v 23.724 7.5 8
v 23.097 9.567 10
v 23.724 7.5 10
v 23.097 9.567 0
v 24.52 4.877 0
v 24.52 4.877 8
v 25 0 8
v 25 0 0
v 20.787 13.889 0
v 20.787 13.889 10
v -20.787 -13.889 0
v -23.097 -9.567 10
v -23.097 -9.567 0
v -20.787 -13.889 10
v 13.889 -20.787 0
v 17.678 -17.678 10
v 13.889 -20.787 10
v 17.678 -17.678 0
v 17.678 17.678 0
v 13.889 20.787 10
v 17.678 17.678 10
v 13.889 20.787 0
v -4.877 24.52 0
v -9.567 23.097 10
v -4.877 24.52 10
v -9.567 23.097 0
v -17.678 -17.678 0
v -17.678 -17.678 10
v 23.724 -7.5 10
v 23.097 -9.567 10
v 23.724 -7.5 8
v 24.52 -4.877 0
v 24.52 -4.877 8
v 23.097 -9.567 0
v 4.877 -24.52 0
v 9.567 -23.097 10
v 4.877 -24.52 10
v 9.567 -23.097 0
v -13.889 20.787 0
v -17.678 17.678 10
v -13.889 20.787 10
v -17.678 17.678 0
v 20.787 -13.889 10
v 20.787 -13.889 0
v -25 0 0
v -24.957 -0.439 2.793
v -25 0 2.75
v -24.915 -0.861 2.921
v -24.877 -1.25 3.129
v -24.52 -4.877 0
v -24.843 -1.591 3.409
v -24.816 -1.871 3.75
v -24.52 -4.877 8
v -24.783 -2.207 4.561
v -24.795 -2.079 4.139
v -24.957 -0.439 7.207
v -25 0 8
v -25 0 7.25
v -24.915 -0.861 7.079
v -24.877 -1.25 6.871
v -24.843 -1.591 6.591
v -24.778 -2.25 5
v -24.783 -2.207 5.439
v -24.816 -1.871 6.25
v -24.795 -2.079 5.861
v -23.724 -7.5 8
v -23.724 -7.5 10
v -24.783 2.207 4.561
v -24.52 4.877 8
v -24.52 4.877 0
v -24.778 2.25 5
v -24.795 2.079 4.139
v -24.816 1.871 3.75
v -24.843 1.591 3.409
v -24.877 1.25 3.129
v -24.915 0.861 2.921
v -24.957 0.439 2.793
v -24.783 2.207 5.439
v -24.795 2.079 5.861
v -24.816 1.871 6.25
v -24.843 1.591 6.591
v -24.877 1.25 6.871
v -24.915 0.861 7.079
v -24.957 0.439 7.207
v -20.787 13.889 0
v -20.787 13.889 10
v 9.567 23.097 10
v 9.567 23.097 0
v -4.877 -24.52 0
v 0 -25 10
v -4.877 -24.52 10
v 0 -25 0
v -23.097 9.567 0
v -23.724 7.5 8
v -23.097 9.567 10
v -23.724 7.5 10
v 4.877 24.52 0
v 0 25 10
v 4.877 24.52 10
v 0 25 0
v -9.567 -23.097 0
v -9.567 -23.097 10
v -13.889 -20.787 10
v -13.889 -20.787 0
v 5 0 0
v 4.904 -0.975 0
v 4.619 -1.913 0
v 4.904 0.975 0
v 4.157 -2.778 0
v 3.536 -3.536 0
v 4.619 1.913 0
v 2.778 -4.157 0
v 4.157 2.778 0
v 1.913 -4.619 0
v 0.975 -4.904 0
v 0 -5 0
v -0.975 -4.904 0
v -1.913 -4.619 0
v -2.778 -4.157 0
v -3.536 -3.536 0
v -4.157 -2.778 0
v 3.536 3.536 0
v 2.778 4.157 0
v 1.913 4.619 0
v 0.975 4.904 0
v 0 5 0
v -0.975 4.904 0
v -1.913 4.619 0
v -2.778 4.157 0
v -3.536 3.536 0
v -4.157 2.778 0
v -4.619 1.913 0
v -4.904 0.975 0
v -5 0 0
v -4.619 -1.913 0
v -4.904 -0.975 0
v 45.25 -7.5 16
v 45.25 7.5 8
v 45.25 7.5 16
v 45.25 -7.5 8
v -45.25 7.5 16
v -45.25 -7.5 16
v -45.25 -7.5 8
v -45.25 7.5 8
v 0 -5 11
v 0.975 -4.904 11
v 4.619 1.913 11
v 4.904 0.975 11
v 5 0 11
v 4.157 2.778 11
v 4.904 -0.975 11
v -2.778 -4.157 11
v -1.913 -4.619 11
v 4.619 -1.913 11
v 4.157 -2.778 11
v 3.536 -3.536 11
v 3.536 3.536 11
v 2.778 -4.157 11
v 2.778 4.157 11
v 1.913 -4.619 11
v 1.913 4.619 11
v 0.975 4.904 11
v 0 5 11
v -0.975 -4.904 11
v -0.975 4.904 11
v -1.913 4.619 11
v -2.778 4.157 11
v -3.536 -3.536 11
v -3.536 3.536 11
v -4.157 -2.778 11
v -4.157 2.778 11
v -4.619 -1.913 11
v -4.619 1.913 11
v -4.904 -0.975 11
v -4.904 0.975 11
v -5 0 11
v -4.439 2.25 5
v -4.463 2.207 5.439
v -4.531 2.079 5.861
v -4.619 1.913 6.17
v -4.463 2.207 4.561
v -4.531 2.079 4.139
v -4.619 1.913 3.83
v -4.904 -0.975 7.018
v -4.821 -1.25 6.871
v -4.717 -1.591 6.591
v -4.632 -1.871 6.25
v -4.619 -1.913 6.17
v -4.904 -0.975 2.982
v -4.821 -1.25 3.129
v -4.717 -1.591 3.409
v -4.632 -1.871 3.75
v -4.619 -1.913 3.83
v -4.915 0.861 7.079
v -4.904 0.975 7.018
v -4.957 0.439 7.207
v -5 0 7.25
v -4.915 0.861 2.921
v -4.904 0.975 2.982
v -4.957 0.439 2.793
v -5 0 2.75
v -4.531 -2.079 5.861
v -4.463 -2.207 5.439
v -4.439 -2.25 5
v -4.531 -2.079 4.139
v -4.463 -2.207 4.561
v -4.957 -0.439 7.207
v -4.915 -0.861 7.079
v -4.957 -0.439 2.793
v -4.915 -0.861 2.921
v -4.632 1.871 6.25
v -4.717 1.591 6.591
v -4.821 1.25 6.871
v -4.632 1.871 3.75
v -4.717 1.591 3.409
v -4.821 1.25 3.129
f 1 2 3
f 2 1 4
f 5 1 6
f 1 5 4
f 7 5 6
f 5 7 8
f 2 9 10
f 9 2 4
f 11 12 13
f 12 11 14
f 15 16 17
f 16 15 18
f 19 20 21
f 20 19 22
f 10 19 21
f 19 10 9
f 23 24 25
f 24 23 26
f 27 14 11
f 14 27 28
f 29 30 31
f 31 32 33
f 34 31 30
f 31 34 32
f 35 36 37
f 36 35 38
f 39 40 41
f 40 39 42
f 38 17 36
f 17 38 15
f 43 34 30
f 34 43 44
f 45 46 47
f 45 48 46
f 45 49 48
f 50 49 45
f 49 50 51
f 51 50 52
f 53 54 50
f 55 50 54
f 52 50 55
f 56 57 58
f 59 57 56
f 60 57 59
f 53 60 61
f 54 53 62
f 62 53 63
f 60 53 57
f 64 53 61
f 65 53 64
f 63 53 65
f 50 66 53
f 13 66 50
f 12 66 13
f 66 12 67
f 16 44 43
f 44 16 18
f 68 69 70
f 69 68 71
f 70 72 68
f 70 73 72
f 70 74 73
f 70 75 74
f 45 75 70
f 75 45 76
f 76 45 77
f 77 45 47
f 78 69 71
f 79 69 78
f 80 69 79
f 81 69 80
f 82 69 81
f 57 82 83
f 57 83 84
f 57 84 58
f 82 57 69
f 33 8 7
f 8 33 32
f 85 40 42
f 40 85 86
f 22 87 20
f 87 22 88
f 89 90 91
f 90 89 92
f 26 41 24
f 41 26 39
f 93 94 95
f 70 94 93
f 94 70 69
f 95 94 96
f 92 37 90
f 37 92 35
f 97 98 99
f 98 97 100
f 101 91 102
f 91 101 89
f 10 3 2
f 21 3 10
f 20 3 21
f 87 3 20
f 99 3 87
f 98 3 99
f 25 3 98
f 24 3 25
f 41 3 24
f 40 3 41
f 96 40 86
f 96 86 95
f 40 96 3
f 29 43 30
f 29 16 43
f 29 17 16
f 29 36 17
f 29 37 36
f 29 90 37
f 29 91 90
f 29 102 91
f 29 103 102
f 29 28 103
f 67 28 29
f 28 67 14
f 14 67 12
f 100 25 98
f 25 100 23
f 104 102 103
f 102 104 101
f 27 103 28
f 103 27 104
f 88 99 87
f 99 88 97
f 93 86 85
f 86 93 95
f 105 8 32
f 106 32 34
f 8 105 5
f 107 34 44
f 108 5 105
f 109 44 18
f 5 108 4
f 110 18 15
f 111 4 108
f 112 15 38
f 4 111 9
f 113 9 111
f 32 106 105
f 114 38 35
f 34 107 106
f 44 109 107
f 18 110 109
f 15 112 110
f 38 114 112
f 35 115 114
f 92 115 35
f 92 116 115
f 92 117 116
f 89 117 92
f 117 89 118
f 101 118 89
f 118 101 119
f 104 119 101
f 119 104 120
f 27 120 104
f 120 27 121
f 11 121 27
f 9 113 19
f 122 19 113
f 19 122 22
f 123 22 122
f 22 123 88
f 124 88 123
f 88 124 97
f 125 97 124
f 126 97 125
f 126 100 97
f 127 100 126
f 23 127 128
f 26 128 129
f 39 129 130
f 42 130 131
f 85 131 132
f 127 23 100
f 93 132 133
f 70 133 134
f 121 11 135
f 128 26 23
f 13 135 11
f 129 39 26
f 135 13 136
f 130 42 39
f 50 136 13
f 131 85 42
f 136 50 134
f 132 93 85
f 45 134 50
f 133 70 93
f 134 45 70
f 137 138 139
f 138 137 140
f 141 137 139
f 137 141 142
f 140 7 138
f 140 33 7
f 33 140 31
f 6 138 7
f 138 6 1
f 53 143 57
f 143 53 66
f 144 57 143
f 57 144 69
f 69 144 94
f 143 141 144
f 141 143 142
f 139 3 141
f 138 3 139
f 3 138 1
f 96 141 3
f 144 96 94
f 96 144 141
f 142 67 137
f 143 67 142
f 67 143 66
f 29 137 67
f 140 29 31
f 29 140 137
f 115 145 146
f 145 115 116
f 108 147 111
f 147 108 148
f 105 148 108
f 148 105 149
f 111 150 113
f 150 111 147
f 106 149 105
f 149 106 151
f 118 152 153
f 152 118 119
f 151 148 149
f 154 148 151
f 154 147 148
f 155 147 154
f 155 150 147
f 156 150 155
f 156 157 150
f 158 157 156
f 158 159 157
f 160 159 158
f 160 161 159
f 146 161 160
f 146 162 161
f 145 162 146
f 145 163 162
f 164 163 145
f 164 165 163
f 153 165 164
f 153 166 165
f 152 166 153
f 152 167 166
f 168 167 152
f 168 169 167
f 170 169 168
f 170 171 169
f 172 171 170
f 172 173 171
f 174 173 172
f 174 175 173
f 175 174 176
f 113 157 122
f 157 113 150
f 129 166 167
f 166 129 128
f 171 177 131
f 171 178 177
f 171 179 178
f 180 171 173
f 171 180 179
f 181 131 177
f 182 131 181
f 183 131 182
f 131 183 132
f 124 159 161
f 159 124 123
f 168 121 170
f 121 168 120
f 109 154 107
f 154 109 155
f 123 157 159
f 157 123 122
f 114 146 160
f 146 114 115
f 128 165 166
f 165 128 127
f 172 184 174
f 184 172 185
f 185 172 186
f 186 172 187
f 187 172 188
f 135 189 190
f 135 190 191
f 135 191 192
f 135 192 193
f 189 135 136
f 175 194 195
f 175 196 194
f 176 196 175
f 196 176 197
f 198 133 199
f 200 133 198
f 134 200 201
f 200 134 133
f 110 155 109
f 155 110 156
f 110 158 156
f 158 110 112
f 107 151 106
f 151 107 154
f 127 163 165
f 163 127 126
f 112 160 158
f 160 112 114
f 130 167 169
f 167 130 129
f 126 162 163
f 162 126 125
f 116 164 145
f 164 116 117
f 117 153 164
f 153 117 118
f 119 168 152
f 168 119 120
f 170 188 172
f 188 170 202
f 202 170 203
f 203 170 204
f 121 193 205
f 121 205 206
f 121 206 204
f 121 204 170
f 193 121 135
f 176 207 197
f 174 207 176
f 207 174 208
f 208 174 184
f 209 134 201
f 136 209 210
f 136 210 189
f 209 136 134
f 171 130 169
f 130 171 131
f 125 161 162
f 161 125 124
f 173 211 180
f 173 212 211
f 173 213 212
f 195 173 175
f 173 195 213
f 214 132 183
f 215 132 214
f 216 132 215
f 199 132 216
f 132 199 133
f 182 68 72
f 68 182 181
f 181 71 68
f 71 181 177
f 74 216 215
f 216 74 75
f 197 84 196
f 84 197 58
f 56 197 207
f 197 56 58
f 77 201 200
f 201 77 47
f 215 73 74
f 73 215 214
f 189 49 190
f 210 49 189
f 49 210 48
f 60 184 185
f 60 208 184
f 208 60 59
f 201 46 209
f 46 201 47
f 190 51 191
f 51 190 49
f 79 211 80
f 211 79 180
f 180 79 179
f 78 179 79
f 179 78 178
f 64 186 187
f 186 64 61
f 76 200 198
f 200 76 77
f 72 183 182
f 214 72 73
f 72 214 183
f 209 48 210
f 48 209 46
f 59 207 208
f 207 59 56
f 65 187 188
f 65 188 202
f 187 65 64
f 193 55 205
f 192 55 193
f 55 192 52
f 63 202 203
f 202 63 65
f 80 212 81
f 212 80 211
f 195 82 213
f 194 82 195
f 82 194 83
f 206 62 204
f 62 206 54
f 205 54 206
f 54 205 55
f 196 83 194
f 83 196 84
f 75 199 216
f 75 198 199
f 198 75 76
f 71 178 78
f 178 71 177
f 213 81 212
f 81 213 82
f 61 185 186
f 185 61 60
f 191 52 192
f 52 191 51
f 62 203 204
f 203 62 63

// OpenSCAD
$fn = 32;

// ----------------------------------------------------------------------
// Hand knob: 50 x 90.5 x 10 mm
// ----------------------------------------------------------------------

// --- parameters (mm) ---
head_d = 50;              // knob diameter
head_h = 10;              // knob height
hole_d = 10;              // shaft bore
set_d = 4.5;              // set screw tap hole
wing_l = 90.5;            // wing span
wing_w = 15;              // wing width
wing_h = 6;               // wing thickness

module body() {
  cylinder(h = head_h, d = head_d);
}

module wing() {
  /* wing sunk 2 mm into the knob so the joint overlaps */
  translate([-wing_l / 2, -wing_w / 2, head_h - 2])
    cube([wing_l, wing_w, wing_h + 2]);
}

difference() {
  union() {
    body();
    wing();
  }
  translate([0, 0, -1]) cylinder(h = head_h + 0 + 2, d = hole_d);
  translate([-head_d / 2 - 1, 0, head_h * 0.5]) rotate([0, 90, 0]) cylinder(h = head_d / 2 + 2, d = set_d);
}
